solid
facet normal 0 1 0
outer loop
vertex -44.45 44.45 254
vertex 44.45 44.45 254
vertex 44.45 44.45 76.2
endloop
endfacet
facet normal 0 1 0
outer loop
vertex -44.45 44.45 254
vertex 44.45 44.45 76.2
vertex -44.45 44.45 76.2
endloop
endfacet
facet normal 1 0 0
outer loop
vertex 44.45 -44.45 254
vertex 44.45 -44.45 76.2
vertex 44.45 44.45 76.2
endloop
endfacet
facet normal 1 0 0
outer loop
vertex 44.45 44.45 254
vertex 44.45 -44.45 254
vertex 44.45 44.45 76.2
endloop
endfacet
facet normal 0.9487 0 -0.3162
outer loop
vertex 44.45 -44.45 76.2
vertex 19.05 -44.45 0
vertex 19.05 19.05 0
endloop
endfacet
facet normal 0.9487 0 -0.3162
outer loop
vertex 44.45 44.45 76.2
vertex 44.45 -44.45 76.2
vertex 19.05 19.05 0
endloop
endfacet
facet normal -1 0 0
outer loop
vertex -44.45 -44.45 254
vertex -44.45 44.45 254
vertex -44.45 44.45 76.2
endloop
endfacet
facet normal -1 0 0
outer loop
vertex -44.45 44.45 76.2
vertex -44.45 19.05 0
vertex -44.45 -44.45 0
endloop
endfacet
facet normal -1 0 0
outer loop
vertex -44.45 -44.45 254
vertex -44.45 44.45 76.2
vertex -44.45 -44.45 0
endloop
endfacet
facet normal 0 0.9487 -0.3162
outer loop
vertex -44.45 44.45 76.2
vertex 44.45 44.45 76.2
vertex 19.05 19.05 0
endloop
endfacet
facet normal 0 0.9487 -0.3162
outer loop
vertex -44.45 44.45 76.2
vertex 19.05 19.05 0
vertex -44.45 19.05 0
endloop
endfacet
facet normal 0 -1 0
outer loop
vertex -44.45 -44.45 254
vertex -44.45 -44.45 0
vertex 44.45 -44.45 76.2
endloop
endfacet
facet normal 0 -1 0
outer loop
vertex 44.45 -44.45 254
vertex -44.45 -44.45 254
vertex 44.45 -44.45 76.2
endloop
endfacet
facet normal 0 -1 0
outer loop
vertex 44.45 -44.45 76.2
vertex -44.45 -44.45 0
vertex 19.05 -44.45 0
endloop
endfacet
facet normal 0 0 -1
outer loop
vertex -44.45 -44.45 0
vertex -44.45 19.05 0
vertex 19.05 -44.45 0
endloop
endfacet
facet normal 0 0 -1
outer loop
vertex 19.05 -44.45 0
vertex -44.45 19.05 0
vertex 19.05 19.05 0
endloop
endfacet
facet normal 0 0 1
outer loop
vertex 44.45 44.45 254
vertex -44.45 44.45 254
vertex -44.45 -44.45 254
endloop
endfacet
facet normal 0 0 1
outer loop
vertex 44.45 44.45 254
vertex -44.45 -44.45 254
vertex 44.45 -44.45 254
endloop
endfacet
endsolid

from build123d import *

# Parameters (mm, degrees)
F0_W     = 44.45
F0_H     = 44.45
F1_DEPTH = 254
F2_SIZE2 = 76.2
F2_SIZE  = 25.4
F3_SIZE2 = 76.2
F3_SIZE  = 25.4


with BuildPart() as f1:
    # F0 (on Top) → F1 (new body)
    with BuildSketch(Plane.XY):
        with Locations((-22.225, 22.225)):
            Rectangle(F0_W, F0_H)
        with Locations((22.225, 22.225)):
            Rectangle(F0_W, F0_H)
        with Locations((22.225, -22.225)):
            Rectangle(F0_W, F0_H)
        with Locations((-22.225, -22.225)):
            Rectangle(F0_W, F0_H)
    extrude(amount=F1_DEPTH)

    # F2
    f2_edges = [f1.edges().sort_by_distance(p)[0] for p in [
        (44.45, 0, 0),
    ]]
    f2_side = f1.faces().sort_by_distance((0, 0, 0))[0]
    chamfer(f2_edges, length=F2_SIZE, length2=F2_SIZE2, reference=f2_side)

    # F3
    f3_edges = [f1.edges().sort_by_distance(p)[0] for p in [
        (-12.7, 44.45, 0),
    ]]
    f3_side = f1.faces().sort_by_distance((-12.7, 0, 0))[0]
    chamfer(f3_edges, length=F3_SIZE, length2=F3_SIZE2, reference=f3_side)


solid = f1.part
